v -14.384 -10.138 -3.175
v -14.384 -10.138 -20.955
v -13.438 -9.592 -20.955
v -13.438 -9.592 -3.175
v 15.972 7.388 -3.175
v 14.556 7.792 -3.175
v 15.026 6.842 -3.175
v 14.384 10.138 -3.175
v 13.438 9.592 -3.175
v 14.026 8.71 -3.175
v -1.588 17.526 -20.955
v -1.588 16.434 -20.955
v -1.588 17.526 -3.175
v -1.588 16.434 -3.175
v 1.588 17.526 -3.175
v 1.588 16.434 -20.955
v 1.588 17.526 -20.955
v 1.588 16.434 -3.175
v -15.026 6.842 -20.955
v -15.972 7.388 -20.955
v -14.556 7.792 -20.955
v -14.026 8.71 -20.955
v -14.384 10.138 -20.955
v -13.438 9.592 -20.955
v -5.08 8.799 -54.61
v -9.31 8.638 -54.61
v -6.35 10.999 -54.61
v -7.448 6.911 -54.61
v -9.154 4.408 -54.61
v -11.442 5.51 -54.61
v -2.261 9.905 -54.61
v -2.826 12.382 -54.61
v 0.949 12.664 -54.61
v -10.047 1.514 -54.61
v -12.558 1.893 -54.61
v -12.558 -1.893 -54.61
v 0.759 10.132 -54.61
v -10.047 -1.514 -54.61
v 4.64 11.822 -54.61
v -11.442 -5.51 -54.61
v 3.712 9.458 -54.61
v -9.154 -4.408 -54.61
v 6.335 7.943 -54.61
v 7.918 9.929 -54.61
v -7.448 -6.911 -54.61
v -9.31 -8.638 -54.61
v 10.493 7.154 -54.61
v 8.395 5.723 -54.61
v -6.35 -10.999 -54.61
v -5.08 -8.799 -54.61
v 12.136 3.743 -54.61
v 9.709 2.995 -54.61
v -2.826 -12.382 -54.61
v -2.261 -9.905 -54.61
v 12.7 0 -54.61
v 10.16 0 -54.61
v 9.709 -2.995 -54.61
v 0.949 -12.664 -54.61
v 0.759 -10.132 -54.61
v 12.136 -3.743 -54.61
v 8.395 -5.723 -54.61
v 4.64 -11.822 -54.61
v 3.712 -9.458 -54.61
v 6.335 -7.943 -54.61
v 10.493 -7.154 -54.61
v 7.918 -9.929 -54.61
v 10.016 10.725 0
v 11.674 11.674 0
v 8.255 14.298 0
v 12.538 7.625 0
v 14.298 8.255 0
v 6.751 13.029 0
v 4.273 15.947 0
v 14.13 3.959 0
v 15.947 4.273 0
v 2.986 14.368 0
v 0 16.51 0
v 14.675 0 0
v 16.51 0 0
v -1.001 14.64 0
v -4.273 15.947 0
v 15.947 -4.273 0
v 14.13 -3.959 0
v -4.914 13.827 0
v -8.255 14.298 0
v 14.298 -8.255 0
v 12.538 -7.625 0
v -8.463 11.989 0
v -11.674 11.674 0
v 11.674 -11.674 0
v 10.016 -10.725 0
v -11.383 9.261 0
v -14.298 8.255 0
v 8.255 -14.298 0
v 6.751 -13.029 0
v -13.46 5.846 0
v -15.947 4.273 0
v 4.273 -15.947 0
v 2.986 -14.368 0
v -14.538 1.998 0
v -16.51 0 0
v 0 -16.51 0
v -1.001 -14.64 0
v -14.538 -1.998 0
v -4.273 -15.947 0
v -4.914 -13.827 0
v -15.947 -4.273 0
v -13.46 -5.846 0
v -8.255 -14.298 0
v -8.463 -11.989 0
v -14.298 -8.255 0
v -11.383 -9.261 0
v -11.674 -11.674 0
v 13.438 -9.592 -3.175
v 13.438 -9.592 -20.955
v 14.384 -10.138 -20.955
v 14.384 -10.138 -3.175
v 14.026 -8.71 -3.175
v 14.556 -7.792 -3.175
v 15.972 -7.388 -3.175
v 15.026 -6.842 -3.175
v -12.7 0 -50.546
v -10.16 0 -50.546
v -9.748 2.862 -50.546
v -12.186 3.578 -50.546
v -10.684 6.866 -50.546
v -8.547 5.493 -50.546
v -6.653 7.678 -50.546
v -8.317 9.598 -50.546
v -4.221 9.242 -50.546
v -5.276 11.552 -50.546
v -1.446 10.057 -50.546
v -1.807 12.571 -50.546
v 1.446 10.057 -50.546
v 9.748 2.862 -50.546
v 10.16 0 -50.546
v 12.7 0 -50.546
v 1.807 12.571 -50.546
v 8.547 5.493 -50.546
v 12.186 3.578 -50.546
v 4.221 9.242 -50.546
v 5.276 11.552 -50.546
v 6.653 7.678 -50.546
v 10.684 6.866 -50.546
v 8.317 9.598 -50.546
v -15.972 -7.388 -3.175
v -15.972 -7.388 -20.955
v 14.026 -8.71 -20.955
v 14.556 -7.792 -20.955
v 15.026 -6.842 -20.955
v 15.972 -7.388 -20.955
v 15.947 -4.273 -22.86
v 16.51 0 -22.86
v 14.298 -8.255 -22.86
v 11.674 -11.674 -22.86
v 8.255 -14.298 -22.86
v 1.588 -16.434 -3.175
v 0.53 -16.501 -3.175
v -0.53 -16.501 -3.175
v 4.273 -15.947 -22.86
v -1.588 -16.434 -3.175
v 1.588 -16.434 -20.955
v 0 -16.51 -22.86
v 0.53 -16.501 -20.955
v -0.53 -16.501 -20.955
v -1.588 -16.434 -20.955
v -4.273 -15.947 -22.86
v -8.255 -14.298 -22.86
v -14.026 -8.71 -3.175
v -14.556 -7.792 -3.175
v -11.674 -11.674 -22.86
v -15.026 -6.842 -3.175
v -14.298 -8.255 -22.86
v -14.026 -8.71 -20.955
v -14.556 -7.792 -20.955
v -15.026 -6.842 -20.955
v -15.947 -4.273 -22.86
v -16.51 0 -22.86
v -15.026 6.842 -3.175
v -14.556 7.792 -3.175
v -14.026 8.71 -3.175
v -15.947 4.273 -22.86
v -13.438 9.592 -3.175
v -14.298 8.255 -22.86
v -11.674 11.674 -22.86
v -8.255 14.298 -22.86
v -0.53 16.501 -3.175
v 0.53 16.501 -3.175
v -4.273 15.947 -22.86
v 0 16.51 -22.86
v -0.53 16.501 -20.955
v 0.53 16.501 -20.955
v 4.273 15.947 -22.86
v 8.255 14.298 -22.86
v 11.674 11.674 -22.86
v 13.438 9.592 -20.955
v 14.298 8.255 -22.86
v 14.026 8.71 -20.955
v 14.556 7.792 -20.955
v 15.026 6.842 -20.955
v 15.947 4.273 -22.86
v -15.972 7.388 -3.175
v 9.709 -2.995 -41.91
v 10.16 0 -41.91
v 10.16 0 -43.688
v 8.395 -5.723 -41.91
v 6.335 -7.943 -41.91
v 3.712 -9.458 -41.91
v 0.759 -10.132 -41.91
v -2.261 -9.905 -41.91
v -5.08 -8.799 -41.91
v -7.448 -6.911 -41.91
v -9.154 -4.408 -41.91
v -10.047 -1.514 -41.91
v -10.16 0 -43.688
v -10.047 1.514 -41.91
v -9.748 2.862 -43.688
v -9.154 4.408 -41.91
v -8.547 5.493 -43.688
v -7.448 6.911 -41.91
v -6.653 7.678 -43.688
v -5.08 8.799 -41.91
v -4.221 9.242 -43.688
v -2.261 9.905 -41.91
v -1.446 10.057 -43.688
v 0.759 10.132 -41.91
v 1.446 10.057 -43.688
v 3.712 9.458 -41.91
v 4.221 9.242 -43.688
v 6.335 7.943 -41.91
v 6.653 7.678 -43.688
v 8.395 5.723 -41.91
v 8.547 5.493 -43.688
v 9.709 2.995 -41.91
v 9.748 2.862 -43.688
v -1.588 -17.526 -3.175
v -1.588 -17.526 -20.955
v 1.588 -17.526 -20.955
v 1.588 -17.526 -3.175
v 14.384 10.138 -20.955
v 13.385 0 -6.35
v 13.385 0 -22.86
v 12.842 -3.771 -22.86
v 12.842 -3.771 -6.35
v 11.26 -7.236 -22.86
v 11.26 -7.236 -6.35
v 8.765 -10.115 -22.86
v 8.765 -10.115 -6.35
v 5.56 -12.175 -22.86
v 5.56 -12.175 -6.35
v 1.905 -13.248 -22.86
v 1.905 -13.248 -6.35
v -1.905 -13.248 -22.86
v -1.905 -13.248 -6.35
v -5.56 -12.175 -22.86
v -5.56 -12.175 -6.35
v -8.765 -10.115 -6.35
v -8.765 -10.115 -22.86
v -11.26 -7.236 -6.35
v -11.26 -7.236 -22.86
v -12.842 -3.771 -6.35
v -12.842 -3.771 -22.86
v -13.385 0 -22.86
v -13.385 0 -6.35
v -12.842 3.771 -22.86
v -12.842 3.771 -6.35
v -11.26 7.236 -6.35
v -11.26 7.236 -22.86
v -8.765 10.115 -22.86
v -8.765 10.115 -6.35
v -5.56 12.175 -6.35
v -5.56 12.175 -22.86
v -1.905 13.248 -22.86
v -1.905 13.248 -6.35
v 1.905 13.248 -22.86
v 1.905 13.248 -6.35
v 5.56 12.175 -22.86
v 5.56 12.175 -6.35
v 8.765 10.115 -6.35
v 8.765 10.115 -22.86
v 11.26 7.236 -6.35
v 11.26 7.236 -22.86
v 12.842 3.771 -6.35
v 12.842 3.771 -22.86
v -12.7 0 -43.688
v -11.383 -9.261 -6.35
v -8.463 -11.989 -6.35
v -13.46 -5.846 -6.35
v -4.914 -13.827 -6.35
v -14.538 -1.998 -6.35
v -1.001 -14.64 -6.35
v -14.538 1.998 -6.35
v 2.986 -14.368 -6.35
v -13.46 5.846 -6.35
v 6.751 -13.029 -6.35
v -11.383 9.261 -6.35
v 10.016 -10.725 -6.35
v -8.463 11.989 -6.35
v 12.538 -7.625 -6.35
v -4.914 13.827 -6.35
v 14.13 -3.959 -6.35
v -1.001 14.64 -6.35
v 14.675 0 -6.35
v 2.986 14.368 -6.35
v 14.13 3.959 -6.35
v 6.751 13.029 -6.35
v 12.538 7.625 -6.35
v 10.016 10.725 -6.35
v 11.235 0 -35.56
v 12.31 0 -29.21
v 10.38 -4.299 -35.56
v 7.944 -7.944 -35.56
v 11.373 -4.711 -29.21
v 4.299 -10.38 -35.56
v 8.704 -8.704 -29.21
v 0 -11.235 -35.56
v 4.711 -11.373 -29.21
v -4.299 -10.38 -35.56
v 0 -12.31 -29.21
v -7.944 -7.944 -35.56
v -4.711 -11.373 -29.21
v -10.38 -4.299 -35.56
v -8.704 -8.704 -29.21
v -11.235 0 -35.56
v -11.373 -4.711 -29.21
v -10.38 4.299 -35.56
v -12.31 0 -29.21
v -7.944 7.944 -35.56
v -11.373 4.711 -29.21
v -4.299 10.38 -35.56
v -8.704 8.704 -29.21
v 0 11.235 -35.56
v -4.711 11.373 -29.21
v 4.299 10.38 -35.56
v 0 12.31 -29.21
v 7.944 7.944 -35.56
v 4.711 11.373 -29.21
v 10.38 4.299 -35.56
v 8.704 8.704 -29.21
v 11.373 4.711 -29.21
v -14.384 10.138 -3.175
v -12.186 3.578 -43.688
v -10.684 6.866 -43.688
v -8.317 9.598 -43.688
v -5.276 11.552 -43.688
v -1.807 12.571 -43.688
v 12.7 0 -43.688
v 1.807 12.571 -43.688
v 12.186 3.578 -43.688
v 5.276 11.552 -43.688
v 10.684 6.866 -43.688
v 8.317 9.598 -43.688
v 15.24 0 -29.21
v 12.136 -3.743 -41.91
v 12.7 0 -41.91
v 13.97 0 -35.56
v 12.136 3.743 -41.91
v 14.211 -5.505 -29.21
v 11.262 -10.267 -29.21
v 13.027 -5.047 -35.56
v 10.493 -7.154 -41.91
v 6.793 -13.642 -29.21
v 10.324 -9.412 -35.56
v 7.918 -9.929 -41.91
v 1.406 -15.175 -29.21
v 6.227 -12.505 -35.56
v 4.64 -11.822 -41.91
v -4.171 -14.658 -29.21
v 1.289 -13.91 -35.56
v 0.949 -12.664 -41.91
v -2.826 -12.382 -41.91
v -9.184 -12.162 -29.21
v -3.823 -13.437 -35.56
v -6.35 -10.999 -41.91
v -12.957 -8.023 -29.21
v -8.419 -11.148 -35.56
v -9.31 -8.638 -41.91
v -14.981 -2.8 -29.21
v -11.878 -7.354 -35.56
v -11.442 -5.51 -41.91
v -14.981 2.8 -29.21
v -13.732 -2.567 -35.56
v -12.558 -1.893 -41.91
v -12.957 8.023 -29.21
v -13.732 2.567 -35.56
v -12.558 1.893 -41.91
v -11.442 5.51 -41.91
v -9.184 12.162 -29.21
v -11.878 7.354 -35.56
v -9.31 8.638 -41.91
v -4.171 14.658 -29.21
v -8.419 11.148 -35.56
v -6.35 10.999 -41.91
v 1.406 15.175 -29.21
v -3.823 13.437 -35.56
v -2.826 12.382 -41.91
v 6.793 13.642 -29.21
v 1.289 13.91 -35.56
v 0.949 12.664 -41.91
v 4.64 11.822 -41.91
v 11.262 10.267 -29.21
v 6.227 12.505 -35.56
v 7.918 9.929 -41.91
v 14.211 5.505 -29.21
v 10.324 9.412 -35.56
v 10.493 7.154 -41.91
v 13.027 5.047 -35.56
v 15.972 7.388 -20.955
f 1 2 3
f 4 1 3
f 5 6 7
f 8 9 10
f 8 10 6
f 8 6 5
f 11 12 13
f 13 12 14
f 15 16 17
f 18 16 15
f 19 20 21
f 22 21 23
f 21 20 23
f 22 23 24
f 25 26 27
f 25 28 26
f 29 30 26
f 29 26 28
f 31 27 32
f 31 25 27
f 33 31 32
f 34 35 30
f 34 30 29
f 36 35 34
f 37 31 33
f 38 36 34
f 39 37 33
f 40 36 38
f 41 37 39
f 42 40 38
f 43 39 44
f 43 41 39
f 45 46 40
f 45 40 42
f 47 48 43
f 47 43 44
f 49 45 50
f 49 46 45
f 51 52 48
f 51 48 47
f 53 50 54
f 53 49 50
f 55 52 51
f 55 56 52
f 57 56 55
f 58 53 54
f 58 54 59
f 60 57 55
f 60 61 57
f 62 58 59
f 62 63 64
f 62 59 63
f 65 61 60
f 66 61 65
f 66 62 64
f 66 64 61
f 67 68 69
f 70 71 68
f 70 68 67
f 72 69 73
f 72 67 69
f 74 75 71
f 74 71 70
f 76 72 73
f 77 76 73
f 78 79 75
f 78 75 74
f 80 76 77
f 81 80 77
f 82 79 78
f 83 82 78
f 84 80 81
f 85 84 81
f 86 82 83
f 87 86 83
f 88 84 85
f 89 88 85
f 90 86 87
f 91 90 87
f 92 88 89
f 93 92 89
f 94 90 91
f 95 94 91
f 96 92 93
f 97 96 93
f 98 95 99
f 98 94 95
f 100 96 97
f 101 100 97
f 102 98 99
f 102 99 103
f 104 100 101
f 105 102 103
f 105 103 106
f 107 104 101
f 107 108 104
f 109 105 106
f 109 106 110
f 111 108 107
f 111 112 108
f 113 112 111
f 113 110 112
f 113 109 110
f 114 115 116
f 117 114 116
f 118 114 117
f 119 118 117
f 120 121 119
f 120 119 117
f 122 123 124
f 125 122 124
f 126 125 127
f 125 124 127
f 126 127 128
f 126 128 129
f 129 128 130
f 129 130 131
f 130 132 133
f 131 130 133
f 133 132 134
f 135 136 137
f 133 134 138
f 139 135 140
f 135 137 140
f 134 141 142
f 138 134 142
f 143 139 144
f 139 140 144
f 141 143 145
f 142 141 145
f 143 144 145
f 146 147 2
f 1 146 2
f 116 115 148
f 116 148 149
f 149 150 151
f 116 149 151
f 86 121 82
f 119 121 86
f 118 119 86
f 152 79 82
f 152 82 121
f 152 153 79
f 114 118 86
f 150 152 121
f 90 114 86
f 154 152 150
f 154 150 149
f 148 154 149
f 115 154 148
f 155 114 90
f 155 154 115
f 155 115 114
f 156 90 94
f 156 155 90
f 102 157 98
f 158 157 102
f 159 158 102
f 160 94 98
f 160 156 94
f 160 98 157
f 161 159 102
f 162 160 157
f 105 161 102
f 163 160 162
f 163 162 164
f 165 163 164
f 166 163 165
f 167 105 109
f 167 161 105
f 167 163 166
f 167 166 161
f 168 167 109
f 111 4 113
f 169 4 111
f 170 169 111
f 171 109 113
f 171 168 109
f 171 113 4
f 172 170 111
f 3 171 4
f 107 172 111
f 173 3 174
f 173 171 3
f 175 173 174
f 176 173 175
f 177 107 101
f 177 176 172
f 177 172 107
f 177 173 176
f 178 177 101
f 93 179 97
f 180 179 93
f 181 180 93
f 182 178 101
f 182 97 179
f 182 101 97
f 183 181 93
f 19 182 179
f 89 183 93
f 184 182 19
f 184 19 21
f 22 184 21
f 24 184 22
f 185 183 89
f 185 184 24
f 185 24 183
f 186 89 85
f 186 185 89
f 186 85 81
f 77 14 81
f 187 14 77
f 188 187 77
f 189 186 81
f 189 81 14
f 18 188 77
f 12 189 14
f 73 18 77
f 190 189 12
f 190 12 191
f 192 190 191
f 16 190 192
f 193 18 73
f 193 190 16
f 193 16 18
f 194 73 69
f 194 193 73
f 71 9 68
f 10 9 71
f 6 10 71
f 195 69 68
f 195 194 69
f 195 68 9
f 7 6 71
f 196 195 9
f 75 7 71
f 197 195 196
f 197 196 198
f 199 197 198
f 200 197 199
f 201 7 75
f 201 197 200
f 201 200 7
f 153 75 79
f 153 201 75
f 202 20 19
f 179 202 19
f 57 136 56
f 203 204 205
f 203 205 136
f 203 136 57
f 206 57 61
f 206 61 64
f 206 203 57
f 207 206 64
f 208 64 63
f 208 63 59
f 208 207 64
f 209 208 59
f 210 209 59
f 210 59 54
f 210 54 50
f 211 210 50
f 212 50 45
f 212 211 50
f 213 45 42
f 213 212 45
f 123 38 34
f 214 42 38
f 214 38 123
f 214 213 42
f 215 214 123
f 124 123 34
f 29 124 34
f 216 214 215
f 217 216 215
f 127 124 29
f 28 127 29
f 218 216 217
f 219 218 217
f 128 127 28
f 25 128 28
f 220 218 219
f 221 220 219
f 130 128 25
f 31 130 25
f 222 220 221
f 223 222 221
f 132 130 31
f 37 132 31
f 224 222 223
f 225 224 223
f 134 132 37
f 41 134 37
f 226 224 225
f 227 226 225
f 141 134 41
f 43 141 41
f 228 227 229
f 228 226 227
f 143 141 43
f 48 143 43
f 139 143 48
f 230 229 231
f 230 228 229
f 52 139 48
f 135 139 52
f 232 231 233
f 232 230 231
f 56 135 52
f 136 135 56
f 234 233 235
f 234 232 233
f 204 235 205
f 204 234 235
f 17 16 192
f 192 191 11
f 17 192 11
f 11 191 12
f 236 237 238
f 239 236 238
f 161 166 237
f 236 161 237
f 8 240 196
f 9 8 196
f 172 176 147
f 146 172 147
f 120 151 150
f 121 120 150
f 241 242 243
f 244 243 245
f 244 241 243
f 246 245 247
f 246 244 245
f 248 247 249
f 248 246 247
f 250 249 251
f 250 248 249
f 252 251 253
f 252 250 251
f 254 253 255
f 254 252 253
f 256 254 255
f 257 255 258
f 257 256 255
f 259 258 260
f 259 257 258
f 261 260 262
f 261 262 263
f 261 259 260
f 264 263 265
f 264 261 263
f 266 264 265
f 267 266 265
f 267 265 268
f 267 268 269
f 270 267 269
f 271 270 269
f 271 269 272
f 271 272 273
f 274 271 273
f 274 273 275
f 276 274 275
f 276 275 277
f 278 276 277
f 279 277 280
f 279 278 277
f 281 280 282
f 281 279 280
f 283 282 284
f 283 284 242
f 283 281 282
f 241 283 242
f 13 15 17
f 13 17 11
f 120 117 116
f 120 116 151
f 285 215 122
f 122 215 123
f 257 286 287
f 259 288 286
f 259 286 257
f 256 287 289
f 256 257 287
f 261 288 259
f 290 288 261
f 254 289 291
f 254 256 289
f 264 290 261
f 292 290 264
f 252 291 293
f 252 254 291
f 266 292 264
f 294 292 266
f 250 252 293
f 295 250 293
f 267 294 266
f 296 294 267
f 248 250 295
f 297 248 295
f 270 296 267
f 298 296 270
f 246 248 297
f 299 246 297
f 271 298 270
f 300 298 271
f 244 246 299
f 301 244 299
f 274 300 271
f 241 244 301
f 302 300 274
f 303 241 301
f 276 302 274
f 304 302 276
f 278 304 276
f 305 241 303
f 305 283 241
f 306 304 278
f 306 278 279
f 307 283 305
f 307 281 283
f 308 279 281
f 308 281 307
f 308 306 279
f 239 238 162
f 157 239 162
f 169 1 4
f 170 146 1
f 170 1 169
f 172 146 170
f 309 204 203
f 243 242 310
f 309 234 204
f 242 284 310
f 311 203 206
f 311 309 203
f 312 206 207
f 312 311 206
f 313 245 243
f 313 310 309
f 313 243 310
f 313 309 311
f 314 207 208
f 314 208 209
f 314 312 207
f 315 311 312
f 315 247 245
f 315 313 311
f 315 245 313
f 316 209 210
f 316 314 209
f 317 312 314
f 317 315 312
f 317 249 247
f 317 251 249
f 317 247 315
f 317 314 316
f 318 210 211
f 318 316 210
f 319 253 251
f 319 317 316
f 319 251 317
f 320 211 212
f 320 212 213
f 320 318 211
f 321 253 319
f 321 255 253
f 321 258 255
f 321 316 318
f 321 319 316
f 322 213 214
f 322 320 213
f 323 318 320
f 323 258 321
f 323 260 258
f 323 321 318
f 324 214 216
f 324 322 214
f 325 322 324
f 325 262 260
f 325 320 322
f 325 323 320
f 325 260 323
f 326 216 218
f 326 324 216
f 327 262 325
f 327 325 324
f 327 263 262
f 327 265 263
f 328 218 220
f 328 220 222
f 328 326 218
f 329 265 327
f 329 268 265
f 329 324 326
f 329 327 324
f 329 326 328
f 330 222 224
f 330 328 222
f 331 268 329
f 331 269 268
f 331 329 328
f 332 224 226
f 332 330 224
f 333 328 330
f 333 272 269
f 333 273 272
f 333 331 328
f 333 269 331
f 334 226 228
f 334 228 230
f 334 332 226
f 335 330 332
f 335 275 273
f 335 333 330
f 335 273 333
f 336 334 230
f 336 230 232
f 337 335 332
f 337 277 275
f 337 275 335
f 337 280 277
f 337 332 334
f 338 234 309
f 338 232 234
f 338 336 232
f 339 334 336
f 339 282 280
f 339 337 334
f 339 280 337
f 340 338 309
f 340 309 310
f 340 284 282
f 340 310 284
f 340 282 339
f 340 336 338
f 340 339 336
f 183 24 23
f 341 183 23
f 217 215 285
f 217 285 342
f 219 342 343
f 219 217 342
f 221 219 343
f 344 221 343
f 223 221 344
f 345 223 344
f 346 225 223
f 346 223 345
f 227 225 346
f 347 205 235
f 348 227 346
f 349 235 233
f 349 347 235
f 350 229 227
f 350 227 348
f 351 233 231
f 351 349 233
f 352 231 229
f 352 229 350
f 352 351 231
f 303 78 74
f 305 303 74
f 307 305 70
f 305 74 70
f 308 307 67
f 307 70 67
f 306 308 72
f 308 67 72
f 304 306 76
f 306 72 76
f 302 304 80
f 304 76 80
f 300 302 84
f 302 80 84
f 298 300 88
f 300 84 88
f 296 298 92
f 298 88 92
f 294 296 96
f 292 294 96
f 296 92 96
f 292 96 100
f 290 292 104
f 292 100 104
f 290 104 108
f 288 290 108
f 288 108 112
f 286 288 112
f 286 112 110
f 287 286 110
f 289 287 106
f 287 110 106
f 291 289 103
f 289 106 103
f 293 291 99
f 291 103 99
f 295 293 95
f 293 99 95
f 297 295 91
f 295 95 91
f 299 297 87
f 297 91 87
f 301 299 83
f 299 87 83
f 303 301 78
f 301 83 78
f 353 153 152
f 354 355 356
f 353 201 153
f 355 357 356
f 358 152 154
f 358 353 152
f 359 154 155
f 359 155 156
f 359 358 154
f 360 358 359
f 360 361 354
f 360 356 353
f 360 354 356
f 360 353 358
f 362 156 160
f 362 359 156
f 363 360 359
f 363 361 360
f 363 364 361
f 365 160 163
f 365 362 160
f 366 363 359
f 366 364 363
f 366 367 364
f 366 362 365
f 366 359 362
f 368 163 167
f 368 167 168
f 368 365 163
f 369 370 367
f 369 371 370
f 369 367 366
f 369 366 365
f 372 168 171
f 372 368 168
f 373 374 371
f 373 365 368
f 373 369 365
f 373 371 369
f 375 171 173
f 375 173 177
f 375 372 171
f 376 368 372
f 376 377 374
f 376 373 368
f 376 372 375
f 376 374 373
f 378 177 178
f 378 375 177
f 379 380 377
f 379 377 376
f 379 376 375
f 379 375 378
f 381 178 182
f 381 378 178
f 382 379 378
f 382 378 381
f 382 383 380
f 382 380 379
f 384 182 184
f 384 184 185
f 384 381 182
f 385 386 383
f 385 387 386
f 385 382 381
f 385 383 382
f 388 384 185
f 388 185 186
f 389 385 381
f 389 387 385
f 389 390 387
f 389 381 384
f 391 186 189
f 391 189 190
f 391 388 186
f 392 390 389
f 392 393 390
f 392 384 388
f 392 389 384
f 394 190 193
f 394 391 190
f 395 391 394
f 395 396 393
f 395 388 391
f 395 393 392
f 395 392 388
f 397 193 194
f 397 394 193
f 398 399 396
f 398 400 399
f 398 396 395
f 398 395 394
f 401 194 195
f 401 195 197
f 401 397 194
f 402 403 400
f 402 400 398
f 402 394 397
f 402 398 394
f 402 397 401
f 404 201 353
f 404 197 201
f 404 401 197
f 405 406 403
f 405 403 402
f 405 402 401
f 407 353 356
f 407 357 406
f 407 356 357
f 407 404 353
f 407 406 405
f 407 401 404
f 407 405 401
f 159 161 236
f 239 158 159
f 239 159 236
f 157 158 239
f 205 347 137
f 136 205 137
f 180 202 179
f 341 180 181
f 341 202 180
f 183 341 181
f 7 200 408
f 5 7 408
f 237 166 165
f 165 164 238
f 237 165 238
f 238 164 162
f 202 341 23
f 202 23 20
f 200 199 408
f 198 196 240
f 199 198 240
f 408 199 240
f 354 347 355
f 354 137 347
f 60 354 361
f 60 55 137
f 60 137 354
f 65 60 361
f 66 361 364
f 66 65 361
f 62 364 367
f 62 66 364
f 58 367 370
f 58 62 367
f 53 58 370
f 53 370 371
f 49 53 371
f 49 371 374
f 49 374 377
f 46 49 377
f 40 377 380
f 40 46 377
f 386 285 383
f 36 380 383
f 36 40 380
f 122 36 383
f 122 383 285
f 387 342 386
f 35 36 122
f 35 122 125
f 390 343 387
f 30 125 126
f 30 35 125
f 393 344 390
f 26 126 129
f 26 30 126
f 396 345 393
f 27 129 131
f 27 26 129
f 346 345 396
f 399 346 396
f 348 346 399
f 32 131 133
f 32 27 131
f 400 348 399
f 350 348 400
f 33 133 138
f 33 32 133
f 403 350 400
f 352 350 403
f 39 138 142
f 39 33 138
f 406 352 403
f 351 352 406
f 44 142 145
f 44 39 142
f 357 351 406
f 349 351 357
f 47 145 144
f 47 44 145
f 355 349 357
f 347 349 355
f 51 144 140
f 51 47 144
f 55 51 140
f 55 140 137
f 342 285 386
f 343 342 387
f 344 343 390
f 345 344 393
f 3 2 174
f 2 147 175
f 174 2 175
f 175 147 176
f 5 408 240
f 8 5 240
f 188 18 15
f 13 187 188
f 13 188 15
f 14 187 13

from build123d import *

# Parameters (mm, degrees)
SKETCH3_R          = 14.674629281
CUT_EXTRUDE1_DEPTH = 6.35
SKETCH4_W          = 6.858
SKETCH4_H          = 15.764878236
CUT_EXTRUDE2_DEPTH = 50.8
SKETCH7_W          = 3.175
SKETCH7_H          = 17.78
FINGERGRIP_DEPTH   = 1.651
GRIPS_START        = -20.955
GRIPS_DEPTH        = 17.78


# Read off the part's stored shape, not the designer's step: grips
with BuildPart() as part:
    # Sketch1 → Revolve3 (revolve)
    with BuildSketch(Plane(origin=(0, 0, 0), x_dir=(0, 0, -1), z_dir=(1, 0, 0)), mode=Mode.PRIVATE) as revolve3_sk:
        Polygon((54.61, 12.700000001), (54.61, 10.16), (41.91, 10.16), (22.86, 13.384649532), (0, 13.384649532), (0, 16.51), (22.86, 16.51), (41.91, 12.700000001), align=None)
    revolve(revolve3_sk.sketch.rotate(Axis((0, 0, 0), (0, 0, -1)), 90), axis=Axis((0, 0, 0), (0, 0, -1)))

    # Sketch3 → Cut-Extrude1 (cut)
    with BuildSketch(Plane.XY):
        Circle(SKETCH3_R)
    extrude(amount=-CUT_EXTRUDE1_DEPTH, mode=Mode.SUBTRACT)

    # Sketch4 → Cut-Extrude2 (cut, symmetric)
    with BuildSketch(Plane(origin=(0, 0, 0), x_dir=(0, 0, -1), z_dir=(1, 0, 0))):
        with Locations((47.117, 7.882439118)):
            Rectangle(SKETCH4_W, SKETCH4_H)
    extrude(amount=CUT_EXTRUDE2_DEPTH, both=True, mode=Mode.SUBTRACT)

    # Sketch7 → fingerGrip (add)
    with BuildSketch(Plane(origin=(0, 15.875, 0), x_dir=(-1, 0, 0), z_dir=(0, 1, 0))):
        with Locations((0, -12.065)):
            Rectangle(SKETCH7_W, SKETCH7_H)
    extrude(amount=FINGERGRIP_DEPTH)

    # grips outline → grips (add)
    with BuildSketch(Plane.XY.offset(GRIPS_START)):
        with BuildLine():
            Line((1.5875, -17.526), (1.5875, -16.433500654))
            ThreePointArc((1.5875, -16.433500654), (0, -16.51), (-1.5875, -16.433500654))
            Line((-1.5875, -16.433500654), (-1.5875, -17.526))
            Line((-1.5875, -17.526), (1.5875, -17.526))
        make_face()
        with BuildLine():
            ThreePointArc((15.02557904, -6.841934999), (14.298079416, -8.255), (13.43807904, -9.591565656))
            Line((13.43807904, -9.591565656), (14.384211227, -10.137815329))
            Line((14.384211227, -10.137815329), (15.971711227, -7.388184671))
            Line((15.971711227, -7.388184671), (15.02557904, -6.841934999))
        make_face()
        with BuildLine():
            Line((-14.384211227, -10.137815329), (-13.43807904, -9.591565656))
            ThreePointArc((-13.43807904, -9.591565656), (-14.298079416, -8.255), (-15.02557904, -6.841934999))
            Line((-15.02557904, -6.841934999), (-15.971711227, -7.388184671))
            Line((-15.971711227, -7.388184671), (-14.384211227, -10.137815329))
        make_face()
        with BuildLine():
            Line((-15.971711227, 7.388184671), (-15.02557904, 6.841934999))
            ThreePointArc((-15.02557904, 6.841934999), (-14.298079416, 8.255), (-13.43807904, 9.591565656))
            Line((-13.43807904, 9.591565656), (-14.384211227, 10.137815329))
            Line((-14.384211227, 10.137815329), (-15.971711227, 7.388184671))
        make_face()
        with BuildLine():
            ThreePointArc((13.43807904, 9.591565656), (14.298079416, 8.255), (15.02557904, 6.841934999))
            Line((15.02557904, 6.841934999), (15.971711227, 7.388184671))
            Line((15.971711227, 7.388184671), (14.384211227, 10.137815329))
            Line((14.384211227, 10.137815329), (13.43807904, 9.591565656))
        make_face()
    extrude(amount=GRIPS_DEPTH)


solid = part.part
